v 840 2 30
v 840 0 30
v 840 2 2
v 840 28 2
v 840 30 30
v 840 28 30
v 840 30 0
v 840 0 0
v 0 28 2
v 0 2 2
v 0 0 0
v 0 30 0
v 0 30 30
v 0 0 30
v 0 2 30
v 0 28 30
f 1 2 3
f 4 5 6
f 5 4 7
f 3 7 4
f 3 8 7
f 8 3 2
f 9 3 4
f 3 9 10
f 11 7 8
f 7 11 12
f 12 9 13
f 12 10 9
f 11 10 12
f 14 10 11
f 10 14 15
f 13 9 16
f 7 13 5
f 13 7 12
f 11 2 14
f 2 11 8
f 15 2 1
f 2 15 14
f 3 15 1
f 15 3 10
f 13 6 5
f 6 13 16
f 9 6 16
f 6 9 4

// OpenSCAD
// Steel U-profile, open side facing upward.
// Axes: length = X, depth = Y, height = Z.
// Open this file directly in OpenSCAD to tune and render the part.

/* [Dimensions] */
profile_length = 840;
profile_depth = 30;
profile_height = 30;
profile_wall = 2;

module u_profile(length, depth, height, wall) {
    union() {
        cube([length, depth, wall]);
        cube([length, wall, height]);
        translate([0, depth - wall, 0])
            cube([length, wall, height]);
    }
}

// Standalone component preview/render.
u_profile(profile_length, profile_depth, profile_height, profile_wall);
